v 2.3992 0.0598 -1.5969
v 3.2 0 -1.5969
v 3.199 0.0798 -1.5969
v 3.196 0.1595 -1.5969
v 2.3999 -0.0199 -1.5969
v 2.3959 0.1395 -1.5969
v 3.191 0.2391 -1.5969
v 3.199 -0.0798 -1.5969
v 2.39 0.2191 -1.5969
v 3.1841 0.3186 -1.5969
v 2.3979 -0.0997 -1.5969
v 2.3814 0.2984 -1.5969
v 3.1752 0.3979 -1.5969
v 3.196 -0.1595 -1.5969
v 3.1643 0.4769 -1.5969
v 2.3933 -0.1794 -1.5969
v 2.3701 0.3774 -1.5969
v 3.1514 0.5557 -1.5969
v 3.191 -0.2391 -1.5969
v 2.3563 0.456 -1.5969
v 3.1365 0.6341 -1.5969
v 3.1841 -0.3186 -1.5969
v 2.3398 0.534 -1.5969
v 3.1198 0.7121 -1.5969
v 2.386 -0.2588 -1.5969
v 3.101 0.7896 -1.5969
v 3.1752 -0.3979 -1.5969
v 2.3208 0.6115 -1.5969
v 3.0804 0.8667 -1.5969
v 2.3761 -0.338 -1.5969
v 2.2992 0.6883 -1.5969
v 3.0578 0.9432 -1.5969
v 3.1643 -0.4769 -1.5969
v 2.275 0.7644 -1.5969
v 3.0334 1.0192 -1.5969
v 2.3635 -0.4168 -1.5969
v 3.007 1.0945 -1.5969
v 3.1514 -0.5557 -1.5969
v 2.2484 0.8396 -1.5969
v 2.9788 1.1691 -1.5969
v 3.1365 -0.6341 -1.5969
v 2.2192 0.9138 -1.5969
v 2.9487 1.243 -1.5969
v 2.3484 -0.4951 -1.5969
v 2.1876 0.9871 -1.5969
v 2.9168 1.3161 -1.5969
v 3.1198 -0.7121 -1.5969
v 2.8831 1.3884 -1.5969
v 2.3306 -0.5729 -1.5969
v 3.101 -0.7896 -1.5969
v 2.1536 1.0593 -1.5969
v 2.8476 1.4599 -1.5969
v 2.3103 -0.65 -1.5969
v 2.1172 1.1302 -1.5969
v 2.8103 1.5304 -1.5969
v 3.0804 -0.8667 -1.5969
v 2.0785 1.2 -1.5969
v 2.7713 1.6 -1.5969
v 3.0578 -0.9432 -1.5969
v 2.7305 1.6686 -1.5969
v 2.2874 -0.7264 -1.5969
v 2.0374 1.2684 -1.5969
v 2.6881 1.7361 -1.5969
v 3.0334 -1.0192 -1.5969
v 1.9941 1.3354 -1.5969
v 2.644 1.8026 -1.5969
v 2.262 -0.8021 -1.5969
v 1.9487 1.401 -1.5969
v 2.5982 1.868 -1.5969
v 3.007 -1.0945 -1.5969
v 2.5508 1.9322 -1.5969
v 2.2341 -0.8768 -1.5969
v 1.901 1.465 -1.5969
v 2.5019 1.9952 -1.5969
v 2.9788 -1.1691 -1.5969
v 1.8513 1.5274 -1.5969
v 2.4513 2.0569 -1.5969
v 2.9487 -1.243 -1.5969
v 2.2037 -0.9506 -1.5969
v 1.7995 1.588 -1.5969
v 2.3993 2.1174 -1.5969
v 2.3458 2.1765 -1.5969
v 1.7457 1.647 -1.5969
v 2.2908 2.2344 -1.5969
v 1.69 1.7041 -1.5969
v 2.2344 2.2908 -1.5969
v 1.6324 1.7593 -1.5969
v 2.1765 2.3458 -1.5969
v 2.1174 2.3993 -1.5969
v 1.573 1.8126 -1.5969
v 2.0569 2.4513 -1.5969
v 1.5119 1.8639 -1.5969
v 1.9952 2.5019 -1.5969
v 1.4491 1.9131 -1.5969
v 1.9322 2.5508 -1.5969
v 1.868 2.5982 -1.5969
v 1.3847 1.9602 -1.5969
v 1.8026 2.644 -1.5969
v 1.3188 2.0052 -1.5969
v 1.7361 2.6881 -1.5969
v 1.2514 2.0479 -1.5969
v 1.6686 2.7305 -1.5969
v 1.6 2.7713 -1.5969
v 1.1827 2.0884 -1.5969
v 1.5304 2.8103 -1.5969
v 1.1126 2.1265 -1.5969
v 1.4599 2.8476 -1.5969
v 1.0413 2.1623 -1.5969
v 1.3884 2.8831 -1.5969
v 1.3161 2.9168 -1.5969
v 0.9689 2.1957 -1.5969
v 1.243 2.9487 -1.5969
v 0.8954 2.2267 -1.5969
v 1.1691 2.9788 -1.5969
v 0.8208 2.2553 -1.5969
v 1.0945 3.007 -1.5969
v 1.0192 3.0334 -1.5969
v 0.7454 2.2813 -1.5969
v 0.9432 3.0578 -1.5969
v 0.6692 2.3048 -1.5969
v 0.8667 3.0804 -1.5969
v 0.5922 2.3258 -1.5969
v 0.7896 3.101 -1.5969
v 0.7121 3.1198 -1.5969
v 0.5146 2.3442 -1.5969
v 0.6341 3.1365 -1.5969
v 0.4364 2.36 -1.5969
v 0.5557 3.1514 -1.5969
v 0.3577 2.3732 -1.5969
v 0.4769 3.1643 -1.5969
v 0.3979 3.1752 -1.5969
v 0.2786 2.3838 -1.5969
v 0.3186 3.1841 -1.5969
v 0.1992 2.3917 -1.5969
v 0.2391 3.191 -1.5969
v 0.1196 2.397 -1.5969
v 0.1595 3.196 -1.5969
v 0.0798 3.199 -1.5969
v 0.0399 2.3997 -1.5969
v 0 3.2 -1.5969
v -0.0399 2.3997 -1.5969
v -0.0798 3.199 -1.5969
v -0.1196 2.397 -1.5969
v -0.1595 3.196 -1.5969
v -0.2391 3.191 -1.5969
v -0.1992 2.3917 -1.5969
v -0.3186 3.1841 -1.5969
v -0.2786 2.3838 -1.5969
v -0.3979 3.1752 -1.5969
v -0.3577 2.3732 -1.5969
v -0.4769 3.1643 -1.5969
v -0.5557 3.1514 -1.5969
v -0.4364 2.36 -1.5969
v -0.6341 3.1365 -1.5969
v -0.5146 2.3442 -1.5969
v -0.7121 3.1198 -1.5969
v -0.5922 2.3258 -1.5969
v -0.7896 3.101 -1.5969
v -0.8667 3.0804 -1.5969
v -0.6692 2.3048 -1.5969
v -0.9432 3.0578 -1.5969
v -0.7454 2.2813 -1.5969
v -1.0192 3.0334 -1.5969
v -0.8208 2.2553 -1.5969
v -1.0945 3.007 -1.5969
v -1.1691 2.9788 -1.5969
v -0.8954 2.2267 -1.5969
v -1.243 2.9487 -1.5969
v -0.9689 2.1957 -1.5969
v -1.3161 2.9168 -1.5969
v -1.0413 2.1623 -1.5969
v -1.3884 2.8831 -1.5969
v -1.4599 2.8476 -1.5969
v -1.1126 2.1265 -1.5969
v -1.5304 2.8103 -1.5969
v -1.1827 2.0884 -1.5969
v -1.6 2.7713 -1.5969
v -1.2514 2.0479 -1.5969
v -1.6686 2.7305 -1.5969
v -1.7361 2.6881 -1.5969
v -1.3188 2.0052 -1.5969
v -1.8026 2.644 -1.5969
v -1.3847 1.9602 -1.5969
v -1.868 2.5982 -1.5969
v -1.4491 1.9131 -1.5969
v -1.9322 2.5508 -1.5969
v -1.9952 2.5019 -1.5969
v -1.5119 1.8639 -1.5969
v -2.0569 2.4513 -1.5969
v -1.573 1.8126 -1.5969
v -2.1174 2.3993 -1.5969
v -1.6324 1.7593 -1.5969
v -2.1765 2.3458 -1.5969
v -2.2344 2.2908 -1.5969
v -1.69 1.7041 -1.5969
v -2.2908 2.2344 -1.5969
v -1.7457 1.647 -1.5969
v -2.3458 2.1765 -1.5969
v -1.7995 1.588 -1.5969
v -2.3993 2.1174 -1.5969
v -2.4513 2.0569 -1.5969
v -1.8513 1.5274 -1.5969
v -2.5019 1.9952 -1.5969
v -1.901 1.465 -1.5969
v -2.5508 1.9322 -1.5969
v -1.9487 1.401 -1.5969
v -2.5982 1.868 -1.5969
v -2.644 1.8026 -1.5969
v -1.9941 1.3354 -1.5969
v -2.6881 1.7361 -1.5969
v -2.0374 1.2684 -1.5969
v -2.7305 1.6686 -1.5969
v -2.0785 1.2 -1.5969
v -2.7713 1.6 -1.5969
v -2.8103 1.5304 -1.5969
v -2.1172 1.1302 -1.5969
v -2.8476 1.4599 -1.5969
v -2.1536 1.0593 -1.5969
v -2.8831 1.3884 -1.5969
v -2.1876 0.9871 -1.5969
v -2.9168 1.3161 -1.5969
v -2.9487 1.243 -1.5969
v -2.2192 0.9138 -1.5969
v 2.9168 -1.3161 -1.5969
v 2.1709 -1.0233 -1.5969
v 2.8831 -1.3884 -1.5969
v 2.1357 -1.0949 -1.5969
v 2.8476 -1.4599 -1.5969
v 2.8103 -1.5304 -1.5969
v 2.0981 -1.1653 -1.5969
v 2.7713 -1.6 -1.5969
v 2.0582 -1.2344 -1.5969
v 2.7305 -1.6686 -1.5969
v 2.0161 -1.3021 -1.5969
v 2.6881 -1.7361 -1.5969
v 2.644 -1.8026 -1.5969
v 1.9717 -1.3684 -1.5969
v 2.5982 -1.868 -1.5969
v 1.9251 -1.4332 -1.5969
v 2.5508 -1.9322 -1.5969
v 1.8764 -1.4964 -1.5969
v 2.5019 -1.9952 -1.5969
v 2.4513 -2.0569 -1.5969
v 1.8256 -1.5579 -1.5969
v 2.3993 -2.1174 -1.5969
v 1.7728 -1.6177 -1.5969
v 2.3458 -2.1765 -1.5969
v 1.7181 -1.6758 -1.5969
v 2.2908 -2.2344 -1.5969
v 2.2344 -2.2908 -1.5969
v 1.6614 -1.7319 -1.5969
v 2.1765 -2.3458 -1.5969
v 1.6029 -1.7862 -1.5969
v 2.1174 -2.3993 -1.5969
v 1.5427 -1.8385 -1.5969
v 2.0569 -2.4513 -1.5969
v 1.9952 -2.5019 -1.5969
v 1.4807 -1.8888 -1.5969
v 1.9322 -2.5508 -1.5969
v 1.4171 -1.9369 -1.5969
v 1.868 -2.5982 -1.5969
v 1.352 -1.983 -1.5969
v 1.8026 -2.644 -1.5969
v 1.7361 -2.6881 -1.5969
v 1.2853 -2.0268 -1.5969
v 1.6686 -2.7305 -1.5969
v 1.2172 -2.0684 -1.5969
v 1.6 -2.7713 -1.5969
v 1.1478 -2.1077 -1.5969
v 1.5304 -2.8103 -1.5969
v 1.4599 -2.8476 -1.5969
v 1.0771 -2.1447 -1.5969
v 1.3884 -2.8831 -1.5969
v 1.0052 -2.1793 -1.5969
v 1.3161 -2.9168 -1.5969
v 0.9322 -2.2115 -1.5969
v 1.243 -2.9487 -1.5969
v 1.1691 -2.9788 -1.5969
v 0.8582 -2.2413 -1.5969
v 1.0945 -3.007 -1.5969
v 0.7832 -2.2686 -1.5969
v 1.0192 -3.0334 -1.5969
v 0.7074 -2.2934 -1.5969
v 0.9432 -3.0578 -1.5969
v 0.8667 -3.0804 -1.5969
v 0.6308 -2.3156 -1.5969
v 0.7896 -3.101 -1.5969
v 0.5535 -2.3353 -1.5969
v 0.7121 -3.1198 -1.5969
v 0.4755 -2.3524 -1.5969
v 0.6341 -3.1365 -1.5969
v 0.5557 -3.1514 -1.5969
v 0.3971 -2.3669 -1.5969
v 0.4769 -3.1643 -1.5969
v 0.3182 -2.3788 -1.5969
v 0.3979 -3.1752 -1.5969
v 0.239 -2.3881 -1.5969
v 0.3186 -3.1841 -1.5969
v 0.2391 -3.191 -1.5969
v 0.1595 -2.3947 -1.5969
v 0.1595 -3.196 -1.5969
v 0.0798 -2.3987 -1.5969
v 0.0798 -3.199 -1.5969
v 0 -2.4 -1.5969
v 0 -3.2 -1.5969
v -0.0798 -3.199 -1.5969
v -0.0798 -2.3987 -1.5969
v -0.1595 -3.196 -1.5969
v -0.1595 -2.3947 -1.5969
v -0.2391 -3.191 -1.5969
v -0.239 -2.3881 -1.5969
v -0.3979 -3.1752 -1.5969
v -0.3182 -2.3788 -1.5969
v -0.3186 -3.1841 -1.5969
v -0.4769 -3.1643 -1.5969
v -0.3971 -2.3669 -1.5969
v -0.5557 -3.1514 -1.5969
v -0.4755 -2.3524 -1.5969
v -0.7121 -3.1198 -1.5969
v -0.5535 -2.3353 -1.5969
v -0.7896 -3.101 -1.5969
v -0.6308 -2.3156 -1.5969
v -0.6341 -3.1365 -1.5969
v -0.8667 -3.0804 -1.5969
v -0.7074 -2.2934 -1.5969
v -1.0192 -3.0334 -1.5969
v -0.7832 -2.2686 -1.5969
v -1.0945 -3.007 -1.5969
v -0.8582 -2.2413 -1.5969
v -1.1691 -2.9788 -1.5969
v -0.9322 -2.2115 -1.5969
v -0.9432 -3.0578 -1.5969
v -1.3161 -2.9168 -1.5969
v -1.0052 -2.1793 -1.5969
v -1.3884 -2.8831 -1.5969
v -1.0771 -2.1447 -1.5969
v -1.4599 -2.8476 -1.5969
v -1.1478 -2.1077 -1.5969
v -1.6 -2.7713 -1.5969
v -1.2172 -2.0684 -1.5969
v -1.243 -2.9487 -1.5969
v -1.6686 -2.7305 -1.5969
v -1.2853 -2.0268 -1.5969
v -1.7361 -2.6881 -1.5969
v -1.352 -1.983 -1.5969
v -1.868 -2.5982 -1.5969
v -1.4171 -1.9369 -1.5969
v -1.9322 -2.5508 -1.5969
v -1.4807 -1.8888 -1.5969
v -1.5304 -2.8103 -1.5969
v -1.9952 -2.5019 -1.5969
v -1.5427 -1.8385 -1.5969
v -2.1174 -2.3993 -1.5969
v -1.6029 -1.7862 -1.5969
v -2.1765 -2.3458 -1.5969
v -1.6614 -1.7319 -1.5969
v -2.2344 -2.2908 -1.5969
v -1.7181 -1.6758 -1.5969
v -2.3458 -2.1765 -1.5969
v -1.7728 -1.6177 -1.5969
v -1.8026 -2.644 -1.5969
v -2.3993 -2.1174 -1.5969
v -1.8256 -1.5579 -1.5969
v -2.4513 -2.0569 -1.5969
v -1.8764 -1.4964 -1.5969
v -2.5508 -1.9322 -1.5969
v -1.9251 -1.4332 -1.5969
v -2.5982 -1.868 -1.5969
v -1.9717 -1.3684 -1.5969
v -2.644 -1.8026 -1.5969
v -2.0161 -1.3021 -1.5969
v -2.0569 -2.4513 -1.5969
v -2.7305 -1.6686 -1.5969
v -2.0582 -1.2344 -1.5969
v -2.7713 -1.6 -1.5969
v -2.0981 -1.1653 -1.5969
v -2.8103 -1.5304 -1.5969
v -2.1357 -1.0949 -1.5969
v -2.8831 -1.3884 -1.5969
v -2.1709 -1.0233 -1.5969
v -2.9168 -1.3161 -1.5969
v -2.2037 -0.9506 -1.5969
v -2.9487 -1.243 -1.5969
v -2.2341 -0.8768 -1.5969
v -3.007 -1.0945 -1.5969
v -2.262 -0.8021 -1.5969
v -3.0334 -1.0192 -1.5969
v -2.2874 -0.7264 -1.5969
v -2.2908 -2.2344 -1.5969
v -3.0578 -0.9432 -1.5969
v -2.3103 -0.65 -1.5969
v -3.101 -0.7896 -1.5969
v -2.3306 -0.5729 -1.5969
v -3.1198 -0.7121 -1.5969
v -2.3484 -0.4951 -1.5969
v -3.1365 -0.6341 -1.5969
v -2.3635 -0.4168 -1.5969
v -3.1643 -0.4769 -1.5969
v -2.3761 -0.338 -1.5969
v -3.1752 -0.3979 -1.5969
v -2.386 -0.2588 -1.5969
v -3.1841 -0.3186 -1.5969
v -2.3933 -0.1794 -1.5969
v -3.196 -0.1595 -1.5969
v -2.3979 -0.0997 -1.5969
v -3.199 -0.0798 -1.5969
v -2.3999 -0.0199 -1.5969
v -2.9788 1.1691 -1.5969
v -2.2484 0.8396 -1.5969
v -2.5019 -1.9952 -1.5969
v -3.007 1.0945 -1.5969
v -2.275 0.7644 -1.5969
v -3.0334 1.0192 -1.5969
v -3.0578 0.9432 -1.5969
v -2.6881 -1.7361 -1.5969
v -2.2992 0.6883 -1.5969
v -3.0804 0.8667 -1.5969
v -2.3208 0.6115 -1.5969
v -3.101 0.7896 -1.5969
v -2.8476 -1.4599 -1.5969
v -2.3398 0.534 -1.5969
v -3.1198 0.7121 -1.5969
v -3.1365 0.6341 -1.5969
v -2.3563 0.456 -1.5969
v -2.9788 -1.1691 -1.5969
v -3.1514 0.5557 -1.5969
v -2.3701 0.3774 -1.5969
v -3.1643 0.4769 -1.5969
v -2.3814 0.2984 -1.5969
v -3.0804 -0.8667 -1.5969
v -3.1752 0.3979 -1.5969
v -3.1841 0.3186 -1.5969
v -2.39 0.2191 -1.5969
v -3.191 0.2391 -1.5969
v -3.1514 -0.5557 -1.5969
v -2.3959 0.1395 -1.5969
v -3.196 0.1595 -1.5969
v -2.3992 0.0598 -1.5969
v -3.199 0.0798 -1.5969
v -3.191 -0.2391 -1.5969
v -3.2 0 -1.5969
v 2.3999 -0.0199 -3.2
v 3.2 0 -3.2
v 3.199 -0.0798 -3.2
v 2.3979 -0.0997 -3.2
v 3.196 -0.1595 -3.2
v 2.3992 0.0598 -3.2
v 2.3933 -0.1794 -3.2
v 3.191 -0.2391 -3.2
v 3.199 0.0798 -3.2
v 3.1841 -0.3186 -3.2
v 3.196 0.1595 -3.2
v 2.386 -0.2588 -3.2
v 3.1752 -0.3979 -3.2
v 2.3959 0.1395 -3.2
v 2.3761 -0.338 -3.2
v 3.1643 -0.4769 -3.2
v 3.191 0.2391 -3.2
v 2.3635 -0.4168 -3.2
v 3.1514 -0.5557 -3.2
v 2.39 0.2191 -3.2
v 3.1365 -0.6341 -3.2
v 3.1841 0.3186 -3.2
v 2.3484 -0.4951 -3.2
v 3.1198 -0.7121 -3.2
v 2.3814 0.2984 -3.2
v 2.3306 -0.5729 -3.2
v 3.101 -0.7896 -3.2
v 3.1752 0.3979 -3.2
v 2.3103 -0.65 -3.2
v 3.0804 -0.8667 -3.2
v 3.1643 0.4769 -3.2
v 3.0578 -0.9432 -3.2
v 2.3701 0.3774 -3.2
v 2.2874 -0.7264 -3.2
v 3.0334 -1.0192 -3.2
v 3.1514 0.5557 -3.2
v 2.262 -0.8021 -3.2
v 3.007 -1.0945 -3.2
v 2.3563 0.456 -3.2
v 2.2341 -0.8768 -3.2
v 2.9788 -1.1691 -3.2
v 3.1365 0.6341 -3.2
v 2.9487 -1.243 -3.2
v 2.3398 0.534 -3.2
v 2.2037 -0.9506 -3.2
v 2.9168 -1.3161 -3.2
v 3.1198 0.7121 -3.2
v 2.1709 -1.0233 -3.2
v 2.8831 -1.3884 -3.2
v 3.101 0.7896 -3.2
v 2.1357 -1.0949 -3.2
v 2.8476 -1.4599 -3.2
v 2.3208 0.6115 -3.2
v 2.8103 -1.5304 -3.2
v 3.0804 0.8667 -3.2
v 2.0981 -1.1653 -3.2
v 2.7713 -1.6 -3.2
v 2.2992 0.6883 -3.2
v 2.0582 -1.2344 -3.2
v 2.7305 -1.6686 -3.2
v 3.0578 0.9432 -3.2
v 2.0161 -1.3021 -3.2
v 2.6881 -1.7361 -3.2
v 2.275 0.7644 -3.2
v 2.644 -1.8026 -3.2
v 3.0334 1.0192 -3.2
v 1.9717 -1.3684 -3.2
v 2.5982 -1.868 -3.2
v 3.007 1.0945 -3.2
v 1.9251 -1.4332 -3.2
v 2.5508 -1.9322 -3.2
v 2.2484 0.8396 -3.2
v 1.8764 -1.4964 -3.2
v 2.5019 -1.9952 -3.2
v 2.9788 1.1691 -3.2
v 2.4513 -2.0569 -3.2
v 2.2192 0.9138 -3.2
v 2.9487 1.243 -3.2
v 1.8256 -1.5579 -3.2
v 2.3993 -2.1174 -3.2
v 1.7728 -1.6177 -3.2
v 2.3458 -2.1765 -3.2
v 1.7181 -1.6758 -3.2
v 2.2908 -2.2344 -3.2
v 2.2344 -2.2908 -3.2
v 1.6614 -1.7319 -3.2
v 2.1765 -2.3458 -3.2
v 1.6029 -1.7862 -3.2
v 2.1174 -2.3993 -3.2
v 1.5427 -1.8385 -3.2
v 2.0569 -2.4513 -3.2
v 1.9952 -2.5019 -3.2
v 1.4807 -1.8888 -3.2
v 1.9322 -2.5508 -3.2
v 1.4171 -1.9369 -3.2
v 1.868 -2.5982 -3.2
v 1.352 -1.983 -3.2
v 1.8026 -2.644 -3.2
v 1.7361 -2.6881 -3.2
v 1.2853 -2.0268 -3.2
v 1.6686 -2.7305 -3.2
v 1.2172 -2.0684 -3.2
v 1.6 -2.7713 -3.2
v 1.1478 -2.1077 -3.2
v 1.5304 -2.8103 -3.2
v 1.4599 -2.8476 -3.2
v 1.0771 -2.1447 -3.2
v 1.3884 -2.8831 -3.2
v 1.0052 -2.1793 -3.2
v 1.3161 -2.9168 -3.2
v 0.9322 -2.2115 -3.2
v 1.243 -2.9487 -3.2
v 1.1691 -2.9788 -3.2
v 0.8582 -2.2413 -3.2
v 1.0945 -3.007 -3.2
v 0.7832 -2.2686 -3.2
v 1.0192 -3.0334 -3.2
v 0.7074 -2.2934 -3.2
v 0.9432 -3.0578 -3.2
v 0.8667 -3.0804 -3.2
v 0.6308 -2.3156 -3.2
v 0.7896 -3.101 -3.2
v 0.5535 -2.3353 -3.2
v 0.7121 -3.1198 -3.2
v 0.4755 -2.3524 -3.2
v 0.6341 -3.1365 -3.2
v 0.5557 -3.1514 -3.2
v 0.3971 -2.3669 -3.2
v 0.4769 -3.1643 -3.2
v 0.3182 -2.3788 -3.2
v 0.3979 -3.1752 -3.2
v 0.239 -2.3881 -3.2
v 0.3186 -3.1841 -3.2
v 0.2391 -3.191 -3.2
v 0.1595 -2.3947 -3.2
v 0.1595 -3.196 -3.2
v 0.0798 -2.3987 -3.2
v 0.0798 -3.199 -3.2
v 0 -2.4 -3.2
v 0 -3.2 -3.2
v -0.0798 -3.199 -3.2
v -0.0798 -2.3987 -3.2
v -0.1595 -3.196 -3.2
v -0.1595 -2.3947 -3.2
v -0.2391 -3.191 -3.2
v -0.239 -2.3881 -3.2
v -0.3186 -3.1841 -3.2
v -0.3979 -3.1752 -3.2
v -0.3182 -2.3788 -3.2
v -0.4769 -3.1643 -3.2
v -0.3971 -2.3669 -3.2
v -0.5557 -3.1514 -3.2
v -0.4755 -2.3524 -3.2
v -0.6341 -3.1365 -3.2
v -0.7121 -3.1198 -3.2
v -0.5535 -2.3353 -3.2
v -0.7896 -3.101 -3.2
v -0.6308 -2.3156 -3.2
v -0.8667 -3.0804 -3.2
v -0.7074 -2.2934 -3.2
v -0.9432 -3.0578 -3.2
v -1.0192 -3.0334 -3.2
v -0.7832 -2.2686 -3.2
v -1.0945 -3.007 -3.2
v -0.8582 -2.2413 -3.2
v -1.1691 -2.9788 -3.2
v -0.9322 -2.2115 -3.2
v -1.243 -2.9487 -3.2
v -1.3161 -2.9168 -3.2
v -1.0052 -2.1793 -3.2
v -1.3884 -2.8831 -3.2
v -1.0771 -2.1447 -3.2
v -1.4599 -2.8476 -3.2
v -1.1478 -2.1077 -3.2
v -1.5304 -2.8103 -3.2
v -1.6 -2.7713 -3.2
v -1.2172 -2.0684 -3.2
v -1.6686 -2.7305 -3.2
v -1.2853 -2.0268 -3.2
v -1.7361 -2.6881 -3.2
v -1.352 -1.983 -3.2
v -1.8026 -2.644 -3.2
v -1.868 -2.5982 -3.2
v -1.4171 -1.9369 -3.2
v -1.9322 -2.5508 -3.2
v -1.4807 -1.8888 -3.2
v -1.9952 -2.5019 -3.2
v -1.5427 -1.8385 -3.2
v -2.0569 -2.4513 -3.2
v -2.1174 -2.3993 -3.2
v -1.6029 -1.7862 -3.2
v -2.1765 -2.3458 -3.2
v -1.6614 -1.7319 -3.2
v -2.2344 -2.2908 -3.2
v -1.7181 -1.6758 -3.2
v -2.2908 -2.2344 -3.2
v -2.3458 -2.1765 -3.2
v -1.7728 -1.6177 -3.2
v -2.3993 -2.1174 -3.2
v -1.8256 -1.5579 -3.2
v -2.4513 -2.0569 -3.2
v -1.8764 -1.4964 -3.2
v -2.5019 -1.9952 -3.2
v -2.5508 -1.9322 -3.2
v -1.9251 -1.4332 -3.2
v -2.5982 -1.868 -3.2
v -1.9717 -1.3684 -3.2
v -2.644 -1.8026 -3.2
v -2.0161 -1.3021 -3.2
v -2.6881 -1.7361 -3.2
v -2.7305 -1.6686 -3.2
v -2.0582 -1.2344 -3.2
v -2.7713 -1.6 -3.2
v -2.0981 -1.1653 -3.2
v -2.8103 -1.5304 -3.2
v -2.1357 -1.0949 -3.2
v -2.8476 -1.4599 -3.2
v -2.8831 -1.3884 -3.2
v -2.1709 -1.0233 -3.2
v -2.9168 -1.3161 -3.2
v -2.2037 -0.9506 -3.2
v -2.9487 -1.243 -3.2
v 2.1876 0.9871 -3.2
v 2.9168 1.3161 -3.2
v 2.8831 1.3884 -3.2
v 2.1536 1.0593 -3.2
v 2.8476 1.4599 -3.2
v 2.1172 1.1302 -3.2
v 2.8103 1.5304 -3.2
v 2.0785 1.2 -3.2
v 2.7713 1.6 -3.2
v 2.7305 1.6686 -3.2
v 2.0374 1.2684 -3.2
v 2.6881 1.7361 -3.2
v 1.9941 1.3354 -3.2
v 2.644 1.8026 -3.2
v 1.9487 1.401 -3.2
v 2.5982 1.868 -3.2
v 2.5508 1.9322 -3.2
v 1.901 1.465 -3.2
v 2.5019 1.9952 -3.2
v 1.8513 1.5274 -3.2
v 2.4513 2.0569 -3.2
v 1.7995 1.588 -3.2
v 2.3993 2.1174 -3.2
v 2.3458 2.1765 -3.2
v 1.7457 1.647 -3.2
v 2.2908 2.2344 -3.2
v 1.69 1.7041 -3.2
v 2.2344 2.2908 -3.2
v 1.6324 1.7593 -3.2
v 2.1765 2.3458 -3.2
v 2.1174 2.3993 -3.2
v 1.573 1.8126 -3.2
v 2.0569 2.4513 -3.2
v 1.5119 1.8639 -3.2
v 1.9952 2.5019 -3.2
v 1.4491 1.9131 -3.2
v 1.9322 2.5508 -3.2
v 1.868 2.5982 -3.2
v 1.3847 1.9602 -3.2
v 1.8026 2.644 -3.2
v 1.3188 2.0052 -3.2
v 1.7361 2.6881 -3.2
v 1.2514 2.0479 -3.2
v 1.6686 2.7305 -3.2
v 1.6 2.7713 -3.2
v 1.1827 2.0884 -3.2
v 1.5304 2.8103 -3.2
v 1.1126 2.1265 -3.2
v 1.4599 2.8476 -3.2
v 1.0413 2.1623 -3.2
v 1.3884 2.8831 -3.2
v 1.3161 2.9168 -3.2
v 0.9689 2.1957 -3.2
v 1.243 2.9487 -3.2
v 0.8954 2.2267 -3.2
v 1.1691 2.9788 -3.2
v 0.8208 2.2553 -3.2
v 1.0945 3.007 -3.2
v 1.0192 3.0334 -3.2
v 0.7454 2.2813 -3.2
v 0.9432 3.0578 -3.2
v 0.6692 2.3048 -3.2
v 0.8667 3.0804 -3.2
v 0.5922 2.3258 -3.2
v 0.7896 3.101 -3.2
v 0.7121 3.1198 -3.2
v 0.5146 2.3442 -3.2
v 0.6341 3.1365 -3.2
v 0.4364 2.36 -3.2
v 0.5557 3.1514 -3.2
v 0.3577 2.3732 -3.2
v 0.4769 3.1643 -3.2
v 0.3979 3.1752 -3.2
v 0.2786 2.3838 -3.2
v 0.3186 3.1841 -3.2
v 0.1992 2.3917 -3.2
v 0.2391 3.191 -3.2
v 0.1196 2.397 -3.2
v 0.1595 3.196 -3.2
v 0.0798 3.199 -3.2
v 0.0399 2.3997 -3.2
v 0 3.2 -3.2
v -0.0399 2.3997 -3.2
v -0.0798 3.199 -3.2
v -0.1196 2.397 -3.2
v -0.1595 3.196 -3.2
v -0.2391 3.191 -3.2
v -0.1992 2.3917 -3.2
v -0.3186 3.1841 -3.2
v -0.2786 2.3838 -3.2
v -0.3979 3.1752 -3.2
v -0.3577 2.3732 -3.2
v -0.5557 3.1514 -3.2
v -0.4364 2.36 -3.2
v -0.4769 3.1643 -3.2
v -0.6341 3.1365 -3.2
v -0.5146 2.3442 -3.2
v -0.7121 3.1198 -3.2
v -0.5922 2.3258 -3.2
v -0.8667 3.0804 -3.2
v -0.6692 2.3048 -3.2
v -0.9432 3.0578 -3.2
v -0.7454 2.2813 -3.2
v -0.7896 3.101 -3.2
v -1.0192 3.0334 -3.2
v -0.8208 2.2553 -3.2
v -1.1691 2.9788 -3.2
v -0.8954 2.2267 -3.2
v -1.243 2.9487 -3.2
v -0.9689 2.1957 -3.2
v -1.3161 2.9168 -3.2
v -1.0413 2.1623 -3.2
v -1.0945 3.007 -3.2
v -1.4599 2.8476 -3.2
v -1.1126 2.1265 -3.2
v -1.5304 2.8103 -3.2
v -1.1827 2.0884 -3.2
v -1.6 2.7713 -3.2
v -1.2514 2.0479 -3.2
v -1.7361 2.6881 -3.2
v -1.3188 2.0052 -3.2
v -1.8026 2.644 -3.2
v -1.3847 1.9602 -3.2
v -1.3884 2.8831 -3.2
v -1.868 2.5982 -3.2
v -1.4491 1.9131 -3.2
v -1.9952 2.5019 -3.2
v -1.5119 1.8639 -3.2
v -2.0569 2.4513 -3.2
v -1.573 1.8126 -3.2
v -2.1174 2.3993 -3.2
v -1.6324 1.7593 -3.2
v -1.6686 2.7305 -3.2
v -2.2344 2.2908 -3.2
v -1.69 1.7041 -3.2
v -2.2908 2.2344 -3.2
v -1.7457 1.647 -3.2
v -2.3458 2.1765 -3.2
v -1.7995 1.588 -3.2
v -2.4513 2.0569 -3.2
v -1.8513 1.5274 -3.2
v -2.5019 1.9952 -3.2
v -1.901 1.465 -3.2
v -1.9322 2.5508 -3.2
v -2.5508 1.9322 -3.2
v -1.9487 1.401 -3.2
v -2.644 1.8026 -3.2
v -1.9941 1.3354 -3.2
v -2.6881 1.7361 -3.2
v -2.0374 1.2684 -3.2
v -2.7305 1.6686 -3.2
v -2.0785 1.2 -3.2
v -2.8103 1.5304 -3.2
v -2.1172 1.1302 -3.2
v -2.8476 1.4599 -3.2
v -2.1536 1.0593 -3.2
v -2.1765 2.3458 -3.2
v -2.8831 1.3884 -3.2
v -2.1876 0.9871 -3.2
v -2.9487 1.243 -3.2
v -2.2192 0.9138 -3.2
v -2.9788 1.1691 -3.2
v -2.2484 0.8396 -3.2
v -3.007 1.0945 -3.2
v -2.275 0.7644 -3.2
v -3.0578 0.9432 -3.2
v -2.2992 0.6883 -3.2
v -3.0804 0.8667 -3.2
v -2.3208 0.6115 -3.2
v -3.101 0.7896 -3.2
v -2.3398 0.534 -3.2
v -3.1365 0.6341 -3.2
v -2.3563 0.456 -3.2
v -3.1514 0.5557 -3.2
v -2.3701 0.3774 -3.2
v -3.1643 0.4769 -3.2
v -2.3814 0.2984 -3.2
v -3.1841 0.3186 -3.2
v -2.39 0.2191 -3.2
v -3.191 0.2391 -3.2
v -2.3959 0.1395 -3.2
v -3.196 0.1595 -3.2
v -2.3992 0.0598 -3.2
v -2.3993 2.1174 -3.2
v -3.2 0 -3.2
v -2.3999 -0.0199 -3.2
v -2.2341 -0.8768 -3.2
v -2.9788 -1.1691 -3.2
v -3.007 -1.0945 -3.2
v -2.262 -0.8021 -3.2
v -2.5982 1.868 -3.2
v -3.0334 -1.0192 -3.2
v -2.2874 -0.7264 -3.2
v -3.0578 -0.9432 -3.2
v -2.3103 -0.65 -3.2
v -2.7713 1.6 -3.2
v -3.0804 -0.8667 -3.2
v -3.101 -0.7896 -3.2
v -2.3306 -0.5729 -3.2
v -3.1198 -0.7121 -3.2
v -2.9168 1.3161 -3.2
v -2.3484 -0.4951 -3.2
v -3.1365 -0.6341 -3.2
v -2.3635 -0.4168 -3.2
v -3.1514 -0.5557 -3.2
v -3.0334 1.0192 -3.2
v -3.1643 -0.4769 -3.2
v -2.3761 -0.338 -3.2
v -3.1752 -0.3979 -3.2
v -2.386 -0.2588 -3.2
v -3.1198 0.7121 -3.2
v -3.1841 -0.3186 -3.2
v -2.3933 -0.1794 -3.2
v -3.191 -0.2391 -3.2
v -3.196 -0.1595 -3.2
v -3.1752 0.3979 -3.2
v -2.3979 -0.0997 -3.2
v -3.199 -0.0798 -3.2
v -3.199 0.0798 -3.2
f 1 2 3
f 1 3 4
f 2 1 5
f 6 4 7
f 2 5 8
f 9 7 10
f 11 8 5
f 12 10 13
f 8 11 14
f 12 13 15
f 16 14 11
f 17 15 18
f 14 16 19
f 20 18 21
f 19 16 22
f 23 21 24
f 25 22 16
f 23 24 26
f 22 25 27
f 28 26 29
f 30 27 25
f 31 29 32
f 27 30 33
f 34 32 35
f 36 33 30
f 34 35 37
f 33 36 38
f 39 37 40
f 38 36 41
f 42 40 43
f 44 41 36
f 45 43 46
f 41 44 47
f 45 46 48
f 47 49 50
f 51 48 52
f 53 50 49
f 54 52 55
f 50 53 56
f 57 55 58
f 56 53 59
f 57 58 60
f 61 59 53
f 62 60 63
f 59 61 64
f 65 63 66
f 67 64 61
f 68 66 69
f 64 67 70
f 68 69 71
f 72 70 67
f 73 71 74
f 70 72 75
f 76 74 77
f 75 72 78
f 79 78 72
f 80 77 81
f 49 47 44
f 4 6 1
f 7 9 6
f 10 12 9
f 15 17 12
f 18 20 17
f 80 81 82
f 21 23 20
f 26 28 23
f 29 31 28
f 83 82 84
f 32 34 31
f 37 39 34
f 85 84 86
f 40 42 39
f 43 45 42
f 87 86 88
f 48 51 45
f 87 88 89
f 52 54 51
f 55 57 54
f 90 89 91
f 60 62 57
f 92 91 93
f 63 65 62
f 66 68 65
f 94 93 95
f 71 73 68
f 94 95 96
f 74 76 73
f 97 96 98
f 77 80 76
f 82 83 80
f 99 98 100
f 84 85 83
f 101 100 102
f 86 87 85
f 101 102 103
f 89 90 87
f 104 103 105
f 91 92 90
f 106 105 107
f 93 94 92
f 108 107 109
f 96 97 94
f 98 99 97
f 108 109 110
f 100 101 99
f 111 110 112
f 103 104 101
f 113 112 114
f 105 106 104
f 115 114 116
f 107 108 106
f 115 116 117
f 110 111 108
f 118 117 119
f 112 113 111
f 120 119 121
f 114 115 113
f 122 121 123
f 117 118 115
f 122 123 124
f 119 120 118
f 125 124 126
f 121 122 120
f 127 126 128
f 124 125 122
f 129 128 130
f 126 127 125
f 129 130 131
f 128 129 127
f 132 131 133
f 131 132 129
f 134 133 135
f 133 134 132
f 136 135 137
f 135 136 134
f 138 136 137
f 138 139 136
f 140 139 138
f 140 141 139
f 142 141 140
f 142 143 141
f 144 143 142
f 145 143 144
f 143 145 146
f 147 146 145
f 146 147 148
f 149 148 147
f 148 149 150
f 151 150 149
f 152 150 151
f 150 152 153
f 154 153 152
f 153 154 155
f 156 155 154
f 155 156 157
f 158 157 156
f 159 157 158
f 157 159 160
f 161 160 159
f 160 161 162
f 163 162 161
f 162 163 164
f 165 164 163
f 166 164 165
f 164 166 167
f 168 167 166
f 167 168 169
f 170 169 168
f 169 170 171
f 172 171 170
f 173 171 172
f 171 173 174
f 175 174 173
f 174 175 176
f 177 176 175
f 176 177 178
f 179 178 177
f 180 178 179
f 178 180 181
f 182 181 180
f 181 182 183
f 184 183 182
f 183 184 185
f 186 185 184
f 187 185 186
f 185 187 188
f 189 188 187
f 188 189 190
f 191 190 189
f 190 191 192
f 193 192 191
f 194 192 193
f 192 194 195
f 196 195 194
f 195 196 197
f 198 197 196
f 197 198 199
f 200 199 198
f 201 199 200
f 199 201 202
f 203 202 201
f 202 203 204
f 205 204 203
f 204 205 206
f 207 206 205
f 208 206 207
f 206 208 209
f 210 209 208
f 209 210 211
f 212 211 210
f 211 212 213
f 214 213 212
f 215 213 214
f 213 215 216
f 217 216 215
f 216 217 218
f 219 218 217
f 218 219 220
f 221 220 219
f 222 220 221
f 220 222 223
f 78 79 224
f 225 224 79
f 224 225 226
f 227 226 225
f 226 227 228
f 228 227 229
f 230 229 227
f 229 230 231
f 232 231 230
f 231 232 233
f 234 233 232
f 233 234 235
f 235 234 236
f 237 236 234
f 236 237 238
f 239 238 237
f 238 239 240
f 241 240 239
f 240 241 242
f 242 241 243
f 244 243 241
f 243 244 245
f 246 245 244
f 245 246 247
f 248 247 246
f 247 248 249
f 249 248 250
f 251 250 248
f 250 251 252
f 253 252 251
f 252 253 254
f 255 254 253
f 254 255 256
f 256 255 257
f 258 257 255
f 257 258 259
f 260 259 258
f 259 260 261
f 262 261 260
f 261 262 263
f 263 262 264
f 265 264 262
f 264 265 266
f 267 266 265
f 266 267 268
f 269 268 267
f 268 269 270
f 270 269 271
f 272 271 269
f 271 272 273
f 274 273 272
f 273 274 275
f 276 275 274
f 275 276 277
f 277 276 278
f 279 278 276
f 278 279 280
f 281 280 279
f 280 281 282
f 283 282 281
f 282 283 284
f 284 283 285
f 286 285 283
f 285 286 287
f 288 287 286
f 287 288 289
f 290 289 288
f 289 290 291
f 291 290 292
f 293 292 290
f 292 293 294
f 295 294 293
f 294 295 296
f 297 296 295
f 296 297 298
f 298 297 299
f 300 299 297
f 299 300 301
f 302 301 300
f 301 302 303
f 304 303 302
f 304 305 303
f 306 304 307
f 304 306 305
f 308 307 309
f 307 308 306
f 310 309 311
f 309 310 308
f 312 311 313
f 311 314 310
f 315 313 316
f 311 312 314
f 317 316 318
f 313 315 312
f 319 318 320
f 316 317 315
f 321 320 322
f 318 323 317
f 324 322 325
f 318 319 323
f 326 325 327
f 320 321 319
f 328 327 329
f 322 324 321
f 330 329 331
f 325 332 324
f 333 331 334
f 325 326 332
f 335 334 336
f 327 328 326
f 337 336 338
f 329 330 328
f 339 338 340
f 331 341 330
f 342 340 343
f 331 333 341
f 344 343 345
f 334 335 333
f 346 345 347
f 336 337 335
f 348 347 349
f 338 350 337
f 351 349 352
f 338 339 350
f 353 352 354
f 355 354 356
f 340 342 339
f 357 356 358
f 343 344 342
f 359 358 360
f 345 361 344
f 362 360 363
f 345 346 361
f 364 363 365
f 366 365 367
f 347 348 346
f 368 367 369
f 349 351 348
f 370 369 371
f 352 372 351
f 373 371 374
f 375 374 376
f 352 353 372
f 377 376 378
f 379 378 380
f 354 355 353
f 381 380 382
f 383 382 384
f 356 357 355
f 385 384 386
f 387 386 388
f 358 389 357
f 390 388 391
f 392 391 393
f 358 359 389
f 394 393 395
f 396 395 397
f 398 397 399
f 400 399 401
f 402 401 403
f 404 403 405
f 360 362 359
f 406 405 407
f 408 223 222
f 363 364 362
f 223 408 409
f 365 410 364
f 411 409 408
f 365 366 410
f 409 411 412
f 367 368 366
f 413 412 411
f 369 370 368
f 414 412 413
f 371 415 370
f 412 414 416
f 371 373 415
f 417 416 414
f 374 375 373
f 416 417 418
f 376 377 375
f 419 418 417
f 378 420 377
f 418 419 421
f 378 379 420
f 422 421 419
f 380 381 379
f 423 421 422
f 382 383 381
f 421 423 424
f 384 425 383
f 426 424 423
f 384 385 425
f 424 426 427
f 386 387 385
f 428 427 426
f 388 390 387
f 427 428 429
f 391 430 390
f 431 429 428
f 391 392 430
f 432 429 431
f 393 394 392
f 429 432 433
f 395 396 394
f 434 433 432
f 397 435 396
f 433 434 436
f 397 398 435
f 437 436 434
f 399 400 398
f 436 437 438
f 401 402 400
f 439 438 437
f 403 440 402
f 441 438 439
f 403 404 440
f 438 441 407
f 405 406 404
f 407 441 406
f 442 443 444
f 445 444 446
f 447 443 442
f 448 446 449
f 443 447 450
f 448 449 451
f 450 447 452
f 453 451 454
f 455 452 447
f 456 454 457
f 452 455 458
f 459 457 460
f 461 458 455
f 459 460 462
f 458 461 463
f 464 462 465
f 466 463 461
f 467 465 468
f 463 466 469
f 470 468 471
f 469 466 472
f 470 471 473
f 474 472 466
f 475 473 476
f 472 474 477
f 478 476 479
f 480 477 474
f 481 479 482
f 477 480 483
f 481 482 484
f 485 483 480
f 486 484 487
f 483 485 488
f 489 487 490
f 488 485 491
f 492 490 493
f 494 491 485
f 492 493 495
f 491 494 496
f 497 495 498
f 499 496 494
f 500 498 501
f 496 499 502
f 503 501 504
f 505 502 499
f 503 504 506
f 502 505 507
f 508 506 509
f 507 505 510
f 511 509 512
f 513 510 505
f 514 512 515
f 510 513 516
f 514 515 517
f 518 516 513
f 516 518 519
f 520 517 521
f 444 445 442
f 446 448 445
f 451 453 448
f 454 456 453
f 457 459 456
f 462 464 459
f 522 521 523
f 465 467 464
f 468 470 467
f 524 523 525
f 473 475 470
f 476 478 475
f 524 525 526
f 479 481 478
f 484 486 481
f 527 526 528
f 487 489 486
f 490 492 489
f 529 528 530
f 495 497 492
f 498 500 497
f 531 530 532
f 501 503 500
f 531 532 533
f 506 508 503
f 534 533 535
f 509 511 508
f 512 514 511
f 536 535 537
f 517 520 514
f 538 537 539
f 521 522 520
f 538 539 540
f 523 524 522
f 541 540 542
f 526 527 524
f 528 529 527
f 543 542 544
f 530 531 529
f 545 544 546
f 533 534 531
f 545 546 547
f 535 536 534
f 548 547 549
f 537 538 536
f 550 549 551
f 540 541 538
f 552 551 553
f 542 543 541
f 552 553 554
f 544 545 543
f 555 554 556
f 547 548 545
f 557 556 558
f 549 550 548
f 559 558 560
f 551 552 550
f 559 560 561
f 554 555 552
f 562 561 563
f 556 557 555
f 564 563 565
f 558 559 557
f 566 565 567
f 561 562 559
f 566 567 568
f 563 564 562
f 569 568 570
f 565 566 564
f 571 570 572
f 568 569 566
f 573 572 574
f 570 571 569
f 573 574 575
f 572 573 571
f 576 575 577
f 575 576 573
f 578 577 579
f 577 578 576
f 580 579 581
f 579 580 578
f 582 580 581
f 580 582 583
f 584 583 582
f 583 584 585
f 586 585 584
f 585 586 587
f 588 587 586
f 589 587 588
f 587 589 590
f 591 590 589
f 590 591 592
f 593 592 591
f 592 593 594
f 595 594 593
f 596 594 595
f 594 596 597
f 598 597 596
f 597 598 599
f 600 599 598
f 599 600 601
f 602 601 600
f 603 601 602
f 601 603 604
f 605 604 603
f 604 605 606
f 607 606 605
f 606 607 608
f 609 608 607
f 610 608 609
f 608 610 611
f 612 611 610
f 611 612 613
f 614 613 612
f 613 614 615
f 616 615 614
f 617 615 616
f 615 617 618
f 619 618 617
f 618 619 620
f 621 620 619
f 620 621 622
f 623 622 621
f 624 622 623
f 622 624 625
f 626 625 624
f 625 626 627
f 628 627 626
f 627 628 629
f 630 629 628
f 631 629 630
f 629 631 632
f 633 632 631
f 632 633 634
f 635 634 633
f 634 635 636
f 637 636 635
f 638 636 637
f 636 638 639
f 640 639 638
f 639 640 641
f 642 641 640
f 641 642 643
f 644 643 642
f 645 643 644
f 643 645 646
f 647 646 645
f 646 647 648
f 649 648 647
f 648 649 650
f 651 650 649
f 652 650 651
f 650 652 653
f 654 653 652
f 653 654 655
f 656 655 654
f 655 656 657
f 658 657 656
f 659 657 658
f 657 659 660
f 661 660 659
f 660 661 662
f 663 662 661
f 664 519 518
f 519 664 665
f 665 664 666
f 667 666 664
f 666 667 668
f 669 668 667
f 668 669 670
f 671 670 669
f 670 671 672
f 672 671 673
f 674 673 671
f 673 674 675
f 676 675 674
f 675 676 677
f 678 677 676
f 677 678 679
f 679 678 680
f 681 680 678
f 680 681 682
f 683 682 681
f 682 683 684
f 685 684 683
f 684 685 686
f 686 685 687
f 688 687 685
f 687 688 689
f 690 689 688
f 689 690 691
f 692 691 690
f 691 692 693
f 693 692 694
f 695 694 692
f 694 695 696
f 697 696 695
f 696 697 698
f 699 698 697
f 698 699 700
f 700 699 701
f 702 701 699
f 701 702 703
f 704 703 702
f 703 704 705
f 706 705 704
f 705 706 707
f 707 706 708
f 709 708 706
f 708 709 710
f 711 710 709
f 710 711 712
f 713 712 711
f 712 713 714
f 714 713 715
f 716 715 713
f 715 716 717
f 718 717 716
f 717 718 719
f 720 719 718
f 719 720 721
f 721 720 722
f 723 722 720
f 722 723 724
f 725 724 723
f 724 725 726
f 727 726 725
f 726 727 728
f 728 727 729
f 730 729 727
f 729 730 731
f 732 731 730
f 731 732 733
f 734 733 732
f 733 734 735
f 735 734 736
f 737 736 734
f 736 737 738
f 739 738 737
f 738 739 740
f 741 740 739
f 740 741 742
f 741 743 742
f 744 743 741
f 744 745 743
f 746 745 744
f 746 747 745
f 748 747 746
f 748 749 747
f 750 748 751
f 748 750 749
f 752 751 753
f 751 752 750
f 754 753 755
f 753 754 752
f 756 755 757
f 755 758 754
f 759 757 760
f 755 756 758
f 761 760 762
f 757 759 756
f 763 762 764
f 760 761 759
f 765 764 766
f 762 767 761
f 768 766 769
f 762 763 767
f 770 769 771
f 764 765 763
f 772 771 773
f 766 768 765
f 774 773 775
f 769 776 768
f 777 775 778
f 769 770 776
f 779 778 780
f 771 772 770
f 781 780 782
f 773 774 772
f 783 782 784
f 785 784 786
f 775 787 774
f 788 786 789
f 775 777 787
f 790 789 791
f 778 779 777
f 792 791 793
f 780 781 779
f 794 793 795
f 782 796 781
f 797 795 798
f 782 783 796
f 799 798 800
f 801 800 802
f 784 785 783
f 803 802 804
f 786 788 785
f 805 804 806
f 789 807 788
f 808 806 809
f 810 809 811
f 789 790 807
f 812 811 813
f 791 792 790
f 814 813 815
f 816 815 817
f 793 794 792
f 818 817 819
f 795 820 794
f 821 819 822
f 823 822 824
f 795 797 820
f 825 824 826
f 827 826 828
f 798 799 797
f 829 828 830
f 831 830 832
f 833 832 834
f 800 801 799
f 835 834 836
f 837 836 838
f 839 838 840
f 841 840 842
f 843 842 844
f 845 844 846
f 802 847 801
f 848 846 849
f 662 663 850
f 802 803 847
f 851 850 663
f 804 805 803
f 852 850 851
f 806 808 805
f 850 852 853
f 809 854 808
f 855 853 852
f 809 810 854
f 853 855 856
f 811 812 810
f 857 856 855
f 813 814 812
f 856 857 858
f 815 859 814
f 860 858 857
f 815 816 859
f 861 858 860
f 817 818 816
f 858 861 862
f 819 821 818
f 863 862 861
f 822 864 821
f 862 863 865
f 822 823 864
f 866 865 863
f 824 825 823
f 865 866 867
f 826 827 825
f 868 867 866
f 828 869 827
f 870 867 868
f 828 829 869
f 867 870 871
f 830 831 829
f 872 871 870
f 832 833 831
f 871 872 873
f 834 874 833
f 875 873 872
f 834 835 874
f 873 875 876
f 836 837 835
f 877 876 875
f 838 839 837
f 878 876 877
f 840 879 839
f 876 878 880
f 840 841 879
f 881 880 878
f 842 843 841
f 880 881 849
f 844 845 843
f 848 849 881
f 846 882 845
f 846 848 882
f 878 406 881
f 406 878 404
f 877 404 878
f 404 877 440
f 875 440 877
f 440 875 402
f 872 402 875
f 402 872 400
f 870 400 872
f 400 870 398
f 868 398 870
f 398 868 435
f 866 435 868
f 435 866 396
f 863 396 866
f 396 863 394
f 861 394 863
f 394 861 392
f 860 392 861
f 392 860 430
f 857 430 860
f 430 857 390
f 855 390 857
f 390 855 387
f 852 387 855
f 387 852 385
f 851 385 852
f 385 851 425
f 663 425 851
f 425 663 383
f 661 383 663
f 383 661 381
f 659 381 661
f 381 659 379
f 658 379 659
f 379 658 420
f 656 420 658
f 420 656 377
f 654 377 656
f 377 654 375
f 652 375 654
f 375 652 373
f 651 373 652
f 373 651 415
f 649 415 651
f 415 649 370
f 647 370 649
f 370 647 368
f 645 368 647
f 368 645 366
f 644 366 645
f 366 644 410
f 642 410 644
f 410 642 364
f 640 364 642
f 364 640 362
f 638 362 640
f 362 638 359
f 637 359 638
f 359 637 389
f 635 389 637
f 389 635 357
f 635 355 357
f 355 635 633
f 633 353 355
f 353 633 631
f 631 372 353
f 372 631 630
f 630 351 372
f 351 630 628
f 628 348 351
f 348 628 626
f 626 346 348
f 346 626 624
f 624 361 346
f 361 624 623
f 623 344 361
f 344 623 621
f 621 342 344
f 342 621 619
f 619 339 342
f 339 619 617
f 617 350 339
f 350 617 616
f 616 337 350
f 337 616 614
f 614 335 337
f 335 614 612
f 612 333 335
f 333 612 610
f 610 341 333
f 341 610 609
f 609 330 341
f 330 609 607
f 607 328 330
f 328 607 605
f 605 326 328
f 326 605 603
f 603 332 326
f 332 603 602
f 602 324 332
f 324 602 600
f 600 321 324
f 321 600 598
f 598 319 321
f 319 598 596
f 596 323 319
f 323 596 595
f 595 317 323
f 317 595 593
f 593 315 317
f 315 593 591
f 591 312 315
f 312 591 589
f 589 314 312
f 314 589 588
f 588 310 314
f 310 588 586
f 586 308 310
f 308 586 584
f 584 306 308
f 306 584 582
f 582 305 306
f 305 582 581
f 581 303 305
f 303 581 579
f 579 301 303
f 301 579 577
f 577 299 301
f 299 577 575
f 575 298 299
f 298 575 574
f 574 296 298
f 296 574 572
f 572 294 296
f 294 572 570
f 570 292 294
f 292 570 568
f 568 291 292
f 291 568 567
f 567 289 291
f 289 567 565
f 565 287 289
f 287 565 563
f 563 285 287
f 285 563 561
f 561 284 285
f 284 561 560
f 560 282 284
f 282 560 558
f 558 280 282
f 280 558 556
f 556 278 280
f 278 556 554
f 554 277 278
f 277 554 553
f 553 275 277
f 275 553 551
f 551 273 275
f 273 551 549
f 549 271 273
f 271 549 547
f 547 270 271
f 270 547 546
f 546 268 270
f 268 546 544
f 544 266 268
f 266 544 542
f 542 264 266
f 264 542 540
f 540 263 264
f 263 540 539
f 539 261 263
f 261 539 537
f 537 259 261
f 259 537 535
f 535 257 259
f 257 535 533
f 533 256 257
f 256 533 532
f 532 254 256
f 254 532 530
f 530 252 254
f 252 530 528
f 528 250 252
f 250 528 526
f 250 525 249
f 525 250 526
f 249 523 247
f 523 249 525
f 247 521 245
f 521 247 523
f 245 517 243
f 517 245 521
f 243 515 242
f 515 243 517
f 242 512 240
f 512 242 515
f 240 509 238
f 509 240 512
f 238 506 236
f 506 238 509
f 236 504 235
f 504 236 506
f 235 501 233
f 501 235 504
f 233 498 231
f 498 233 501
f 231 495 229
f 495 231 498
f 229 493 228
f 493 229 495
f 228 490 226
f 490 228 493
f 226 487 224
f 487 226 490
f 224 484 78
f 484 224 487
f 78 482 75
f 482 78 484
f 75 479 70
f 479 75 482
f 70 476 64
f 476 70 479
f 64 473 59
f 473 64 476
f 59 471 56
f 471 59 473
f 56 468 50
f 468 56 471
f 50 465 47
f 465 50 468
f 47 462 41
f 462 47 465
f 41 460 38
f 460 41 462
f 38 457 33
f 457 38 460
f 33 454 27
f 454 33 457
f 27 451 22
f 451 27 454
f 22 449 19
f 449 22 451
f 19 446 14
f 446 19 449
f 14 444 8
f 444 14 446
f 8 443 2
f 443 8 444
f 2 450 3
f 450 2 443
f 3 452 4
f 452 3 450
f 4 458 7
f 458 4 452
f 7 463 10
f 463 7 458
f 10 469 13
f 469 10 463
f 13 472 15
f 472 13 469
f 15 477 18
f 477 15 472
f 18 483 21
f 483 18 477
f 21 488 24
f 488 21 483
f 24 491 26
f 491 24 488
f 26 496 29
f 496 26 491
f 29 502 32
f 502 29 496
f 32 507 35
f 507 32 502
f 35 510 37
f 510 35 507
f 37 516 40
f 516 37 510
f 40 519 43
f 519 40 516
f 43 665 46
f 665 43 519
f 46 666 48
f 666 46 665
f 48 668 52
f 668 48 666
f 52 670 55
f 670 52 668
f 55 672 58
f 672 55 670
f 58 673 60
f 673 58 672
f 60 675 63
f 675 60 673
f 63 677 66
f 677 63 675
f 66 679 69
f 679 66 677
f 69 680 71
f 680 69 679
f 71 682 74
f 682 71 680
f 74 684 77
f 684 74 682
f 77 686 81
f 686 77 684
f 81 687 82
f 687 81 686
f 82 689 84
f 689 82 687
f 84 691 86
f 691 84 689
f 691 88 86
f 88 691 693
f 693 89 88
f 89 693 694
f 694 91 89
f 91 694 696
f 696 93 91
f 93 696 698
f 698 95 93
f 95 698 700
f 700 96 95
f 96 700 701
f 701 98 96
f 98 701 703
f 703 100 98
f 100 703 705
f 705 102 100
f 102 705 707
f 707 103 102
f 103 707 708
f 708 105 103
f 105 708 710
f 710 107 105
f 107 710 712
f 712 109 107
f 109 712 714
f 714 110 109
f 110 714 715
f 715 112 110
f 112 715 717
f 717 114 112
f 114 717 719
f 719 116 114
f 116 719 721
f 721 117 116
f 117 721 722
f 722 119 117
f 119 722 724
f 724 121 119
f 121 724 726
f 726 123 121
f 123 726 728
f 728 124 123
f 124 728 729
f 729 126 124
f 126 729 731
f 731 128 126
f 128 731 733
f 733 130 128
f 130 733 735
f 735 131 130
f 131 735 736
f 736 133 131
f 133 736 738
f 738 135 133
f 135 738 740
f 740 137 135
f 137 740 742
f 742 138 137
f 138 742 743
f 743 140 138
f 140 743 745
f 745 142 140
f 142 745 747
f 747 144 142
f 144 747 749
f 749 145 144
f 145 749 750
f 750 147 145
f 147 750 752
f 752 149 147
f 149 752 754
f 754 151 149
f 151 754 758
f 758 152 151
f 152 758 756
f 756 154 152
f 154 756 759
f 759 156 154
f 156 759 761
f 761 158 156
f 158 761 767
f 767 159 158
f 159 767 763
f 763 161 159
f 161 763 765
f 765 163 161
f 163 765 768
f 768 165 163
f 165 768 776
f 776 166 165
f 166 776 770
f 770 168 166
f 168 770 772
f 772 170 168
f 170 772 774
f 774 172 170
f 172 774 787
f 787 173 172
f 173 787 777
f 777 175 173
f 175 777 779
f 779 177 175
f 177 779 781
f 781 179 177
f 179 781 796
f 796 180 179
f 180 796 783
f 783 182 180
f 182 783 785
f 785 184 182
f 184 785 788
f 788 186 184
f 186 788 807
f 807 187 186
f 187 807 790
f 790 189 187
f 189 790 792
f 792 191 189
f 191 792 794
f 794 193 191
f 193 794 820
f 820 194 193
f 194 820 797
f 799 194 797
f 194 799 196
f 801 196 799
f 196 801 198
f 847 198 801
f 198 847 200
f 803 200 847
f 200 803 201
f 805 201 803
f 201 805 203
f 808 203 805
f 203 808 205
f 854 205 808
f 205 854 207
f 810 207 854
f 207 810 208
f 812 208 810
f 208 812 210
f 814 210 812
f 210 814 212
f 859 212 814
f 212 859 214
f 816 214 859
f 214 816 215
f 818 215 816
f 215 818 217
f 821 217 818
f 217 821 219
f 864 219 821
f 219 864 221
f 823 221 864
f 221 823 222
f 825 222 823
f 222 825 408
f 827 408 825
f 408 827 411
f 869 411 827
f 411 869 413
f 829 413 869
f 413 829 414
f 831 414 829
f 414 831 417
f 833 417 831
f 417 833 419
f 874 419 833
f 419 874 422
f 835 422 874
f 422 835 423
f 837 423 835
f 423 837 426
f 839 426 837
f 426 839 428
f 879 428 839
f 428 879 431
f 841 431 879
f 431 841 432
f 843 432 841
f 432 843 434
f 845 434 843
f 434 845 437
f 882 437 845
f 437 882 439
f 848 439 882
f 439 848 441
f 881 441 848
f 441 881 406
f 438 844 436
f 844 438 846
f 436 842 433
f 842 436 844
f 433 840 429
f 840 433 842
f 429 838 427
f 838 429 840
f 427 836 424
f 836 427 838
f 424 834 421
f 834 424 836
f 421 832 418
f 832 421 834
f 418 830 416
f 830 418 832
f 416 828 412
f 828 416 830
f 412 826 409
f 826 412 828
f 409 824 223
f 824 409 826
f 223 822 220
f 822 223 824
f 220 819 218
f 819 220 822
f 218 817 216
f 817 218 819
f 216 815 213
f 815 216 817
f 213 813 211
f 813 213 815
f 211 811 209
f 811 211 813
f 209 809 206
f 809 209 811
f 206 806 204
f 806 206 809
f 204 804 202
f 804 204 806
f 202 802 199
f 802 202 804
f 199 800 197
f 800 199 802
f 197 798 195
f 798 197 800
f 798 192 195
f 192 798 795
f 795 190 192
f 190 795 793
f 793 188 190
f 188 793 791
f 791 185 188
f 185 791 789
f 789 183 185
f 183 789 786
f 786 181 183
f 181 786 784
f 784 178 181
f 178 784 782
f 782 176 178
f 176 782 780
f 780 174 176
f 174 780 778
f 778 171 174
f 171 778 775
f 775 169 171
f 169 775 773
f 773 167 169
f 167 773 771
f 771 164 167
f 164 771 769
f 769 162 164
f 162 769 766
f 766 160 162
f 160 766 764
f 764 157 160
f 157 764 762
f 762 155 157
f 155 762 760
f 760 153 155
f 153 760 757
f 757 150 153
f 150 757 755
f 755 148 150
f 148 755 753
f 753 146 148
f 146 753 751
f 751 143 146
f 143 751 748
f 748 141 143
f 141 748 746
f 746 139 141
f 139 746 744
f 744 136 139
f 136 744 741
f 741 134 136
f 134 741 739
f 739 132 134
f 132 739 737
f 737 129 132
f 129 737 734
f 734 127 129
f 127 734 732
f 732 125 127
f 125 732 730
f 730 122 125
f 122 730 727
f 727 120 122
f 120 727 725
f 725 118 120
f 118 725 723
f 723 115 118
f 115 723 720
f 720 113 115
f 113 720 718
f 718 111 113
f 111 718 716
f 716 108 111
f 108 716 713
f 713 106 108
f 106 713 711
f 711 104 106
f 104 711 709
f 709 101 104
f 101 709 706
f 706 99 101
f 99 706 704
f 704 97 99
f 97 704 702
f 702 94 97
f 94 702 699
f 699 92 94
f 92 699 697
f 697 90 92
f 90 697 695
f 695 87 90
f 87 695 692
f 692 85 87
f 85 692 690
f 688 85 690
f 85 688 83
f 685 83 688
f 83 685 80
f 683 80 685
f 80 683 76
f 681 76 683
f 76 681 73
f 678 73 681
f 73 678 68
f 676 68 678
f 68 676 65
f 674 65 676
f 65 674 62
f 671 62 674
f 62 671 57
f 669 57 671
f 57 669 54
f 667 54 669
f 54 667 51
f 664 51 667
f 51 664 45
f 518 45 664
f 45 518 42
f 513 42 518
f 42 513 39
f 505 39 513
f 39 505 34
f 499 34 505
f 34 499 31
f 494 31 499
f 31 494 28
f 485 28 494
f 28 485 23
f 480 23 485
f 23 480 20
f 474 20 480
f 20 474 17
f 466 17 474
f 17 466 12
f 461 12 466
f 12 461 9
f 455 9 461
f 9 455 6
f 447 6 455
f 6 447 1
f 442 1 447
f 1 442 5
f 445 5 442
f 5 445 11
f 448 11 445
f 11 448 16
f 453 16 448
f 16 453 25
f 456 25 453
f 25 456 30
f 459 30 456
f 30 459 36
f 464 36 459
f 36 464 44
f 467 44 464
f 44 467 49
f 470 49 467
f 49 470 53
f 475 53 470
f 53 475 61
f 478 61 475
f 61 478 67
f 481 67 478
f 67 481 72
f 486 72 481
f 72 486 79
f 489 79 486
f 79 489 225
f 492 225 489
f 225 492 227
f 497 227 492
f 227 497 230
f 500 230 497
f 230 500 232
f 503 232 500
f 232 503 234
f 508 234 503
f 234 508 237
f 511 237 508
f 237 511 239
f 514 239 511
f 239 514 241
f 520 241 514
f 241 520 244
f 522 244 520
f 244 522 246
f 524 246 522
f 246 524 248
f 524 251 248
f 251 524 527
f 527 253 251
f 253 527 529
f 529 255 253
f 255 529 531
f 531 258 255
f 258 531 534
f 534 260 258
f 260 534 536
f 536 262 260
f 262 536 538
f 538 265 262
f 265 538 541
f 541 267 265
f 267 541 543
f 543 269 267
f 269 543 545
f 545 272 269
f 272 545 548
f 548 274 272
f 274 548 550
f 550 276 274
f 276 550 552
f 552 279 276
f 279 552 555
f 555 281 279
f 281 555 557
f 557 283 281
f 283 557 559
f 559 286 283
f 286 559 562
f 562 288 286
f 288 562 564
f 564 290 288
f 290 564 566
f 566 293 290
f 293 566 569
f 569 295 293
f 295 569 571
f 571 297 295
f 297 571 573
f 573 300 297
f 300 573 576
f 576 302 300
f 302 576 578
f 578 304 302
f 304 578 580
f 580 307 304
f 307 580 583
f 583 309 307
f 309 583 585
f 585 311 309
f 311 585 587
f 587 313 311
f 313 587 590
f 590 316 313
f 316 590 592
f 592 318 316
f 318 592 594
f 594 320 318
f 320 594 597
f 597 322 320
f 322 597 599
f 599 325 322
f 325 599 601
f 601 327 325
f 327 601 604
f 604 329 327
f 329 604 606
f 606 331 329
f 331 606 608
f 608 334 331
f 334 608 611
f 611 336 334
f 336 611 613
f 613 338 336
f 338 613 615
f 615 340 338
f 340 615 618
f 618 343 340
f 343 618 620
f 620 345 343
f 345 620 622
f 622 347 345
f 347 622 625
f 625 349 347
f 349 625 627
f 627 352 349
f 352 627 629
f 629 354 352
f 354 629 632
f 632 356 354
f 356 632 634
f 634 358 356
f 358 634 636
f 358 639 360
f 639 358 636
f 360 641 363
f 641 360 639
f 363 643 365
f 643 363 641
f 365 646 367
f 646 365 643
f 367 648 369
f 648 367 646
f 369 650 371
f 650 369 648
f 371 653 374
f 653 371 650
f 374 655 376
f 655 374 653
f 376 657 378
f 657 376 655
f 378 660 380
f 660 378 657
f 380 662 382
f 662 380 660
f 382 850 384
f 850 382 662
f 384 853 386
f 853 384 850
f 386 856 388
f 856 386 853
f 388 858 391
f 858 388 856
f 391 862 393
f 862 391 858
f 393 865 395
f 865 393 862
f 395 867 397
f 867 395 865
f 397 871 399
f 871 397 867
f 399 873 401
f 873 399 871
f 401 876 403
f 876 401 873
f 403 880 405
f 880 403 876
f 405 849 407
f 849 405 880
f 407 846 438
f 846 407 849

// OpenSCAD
use <../lib.scad>
use <s/14769p03s01.scad>
use <s/14769s01.scad>
$fa=1; $fs=0.2;
function ldraw_lib__14769p03(realsolid=false) = [
// 0 Tile  2 x  2 Round with Round Underside Stud with Magenta and Bright Pink Life Preserver with Curved Bands Pattern
// 0 Name: 14769p03.dat
// 0 Author: Philippe Hurbain [Philo]
// 0 !LDRAW_ORG Part UPDATE 2020-03
// 0 !LICENSE Licensed under CC BY 2.0 and CC BY 4.0 : see CAreadme.txt
// 
// 0 BFC CERTIFY CCW
  [0,"BFC","CERTIFY"],
  [0,"BFC","CCW"],
// 
// 0 !KEYWORDS Beach, boat, Bricklink 14769pb002, Friends, Pool, Set 10747
// 0 !KEYWORDS Set 41028, Set 41033, Set 41099, Set 41306, Set 41313, Set 41316
// 0 !KEYWORDS Set 41317, Set 41347, Set 471801, Set 853778, ship
// 
// 0 !HISTORY 2014-12-23 [PTadmin] Official Update 2014-02
// 0 !HISTORY 2020-09-17 [RainbowDolphin] Subfiled for common print pattern with 4150p08, added Bricklink reference and set numbers
// 0 !HISTORY 2020-12-29 [PTadmin] Official Update 2020-03
// 
// 
// 1 16 0 0 0 1 0 0 0 1 0 0 0 1 s\14769s01.dat
  [1,16,0,0,0,1,0,0,0,1,0,0,0,1, ldraw_lib__s__14769s01(realsolid)],
// 1 16 0 0 0 1 0 0 0 1 0 0 0 1 s\14769p03s01.dat
  [1,16,0,0,0,1,0,0,0,1,0,0,0,1, ldraw_lib__s__14769p03s01(realsolid)],
];
module ldraw_lib__14769p03(step=0, col=false, unit=2/5, alt=false, line=0.2, solid=!$preview)
    makepoly(ldraw_lib__14769p03(solid), step=step, col=col, unit=unit, alt=alt, line=line, solid=solid);
ldraw_lib__14769p03(line=0.2);
